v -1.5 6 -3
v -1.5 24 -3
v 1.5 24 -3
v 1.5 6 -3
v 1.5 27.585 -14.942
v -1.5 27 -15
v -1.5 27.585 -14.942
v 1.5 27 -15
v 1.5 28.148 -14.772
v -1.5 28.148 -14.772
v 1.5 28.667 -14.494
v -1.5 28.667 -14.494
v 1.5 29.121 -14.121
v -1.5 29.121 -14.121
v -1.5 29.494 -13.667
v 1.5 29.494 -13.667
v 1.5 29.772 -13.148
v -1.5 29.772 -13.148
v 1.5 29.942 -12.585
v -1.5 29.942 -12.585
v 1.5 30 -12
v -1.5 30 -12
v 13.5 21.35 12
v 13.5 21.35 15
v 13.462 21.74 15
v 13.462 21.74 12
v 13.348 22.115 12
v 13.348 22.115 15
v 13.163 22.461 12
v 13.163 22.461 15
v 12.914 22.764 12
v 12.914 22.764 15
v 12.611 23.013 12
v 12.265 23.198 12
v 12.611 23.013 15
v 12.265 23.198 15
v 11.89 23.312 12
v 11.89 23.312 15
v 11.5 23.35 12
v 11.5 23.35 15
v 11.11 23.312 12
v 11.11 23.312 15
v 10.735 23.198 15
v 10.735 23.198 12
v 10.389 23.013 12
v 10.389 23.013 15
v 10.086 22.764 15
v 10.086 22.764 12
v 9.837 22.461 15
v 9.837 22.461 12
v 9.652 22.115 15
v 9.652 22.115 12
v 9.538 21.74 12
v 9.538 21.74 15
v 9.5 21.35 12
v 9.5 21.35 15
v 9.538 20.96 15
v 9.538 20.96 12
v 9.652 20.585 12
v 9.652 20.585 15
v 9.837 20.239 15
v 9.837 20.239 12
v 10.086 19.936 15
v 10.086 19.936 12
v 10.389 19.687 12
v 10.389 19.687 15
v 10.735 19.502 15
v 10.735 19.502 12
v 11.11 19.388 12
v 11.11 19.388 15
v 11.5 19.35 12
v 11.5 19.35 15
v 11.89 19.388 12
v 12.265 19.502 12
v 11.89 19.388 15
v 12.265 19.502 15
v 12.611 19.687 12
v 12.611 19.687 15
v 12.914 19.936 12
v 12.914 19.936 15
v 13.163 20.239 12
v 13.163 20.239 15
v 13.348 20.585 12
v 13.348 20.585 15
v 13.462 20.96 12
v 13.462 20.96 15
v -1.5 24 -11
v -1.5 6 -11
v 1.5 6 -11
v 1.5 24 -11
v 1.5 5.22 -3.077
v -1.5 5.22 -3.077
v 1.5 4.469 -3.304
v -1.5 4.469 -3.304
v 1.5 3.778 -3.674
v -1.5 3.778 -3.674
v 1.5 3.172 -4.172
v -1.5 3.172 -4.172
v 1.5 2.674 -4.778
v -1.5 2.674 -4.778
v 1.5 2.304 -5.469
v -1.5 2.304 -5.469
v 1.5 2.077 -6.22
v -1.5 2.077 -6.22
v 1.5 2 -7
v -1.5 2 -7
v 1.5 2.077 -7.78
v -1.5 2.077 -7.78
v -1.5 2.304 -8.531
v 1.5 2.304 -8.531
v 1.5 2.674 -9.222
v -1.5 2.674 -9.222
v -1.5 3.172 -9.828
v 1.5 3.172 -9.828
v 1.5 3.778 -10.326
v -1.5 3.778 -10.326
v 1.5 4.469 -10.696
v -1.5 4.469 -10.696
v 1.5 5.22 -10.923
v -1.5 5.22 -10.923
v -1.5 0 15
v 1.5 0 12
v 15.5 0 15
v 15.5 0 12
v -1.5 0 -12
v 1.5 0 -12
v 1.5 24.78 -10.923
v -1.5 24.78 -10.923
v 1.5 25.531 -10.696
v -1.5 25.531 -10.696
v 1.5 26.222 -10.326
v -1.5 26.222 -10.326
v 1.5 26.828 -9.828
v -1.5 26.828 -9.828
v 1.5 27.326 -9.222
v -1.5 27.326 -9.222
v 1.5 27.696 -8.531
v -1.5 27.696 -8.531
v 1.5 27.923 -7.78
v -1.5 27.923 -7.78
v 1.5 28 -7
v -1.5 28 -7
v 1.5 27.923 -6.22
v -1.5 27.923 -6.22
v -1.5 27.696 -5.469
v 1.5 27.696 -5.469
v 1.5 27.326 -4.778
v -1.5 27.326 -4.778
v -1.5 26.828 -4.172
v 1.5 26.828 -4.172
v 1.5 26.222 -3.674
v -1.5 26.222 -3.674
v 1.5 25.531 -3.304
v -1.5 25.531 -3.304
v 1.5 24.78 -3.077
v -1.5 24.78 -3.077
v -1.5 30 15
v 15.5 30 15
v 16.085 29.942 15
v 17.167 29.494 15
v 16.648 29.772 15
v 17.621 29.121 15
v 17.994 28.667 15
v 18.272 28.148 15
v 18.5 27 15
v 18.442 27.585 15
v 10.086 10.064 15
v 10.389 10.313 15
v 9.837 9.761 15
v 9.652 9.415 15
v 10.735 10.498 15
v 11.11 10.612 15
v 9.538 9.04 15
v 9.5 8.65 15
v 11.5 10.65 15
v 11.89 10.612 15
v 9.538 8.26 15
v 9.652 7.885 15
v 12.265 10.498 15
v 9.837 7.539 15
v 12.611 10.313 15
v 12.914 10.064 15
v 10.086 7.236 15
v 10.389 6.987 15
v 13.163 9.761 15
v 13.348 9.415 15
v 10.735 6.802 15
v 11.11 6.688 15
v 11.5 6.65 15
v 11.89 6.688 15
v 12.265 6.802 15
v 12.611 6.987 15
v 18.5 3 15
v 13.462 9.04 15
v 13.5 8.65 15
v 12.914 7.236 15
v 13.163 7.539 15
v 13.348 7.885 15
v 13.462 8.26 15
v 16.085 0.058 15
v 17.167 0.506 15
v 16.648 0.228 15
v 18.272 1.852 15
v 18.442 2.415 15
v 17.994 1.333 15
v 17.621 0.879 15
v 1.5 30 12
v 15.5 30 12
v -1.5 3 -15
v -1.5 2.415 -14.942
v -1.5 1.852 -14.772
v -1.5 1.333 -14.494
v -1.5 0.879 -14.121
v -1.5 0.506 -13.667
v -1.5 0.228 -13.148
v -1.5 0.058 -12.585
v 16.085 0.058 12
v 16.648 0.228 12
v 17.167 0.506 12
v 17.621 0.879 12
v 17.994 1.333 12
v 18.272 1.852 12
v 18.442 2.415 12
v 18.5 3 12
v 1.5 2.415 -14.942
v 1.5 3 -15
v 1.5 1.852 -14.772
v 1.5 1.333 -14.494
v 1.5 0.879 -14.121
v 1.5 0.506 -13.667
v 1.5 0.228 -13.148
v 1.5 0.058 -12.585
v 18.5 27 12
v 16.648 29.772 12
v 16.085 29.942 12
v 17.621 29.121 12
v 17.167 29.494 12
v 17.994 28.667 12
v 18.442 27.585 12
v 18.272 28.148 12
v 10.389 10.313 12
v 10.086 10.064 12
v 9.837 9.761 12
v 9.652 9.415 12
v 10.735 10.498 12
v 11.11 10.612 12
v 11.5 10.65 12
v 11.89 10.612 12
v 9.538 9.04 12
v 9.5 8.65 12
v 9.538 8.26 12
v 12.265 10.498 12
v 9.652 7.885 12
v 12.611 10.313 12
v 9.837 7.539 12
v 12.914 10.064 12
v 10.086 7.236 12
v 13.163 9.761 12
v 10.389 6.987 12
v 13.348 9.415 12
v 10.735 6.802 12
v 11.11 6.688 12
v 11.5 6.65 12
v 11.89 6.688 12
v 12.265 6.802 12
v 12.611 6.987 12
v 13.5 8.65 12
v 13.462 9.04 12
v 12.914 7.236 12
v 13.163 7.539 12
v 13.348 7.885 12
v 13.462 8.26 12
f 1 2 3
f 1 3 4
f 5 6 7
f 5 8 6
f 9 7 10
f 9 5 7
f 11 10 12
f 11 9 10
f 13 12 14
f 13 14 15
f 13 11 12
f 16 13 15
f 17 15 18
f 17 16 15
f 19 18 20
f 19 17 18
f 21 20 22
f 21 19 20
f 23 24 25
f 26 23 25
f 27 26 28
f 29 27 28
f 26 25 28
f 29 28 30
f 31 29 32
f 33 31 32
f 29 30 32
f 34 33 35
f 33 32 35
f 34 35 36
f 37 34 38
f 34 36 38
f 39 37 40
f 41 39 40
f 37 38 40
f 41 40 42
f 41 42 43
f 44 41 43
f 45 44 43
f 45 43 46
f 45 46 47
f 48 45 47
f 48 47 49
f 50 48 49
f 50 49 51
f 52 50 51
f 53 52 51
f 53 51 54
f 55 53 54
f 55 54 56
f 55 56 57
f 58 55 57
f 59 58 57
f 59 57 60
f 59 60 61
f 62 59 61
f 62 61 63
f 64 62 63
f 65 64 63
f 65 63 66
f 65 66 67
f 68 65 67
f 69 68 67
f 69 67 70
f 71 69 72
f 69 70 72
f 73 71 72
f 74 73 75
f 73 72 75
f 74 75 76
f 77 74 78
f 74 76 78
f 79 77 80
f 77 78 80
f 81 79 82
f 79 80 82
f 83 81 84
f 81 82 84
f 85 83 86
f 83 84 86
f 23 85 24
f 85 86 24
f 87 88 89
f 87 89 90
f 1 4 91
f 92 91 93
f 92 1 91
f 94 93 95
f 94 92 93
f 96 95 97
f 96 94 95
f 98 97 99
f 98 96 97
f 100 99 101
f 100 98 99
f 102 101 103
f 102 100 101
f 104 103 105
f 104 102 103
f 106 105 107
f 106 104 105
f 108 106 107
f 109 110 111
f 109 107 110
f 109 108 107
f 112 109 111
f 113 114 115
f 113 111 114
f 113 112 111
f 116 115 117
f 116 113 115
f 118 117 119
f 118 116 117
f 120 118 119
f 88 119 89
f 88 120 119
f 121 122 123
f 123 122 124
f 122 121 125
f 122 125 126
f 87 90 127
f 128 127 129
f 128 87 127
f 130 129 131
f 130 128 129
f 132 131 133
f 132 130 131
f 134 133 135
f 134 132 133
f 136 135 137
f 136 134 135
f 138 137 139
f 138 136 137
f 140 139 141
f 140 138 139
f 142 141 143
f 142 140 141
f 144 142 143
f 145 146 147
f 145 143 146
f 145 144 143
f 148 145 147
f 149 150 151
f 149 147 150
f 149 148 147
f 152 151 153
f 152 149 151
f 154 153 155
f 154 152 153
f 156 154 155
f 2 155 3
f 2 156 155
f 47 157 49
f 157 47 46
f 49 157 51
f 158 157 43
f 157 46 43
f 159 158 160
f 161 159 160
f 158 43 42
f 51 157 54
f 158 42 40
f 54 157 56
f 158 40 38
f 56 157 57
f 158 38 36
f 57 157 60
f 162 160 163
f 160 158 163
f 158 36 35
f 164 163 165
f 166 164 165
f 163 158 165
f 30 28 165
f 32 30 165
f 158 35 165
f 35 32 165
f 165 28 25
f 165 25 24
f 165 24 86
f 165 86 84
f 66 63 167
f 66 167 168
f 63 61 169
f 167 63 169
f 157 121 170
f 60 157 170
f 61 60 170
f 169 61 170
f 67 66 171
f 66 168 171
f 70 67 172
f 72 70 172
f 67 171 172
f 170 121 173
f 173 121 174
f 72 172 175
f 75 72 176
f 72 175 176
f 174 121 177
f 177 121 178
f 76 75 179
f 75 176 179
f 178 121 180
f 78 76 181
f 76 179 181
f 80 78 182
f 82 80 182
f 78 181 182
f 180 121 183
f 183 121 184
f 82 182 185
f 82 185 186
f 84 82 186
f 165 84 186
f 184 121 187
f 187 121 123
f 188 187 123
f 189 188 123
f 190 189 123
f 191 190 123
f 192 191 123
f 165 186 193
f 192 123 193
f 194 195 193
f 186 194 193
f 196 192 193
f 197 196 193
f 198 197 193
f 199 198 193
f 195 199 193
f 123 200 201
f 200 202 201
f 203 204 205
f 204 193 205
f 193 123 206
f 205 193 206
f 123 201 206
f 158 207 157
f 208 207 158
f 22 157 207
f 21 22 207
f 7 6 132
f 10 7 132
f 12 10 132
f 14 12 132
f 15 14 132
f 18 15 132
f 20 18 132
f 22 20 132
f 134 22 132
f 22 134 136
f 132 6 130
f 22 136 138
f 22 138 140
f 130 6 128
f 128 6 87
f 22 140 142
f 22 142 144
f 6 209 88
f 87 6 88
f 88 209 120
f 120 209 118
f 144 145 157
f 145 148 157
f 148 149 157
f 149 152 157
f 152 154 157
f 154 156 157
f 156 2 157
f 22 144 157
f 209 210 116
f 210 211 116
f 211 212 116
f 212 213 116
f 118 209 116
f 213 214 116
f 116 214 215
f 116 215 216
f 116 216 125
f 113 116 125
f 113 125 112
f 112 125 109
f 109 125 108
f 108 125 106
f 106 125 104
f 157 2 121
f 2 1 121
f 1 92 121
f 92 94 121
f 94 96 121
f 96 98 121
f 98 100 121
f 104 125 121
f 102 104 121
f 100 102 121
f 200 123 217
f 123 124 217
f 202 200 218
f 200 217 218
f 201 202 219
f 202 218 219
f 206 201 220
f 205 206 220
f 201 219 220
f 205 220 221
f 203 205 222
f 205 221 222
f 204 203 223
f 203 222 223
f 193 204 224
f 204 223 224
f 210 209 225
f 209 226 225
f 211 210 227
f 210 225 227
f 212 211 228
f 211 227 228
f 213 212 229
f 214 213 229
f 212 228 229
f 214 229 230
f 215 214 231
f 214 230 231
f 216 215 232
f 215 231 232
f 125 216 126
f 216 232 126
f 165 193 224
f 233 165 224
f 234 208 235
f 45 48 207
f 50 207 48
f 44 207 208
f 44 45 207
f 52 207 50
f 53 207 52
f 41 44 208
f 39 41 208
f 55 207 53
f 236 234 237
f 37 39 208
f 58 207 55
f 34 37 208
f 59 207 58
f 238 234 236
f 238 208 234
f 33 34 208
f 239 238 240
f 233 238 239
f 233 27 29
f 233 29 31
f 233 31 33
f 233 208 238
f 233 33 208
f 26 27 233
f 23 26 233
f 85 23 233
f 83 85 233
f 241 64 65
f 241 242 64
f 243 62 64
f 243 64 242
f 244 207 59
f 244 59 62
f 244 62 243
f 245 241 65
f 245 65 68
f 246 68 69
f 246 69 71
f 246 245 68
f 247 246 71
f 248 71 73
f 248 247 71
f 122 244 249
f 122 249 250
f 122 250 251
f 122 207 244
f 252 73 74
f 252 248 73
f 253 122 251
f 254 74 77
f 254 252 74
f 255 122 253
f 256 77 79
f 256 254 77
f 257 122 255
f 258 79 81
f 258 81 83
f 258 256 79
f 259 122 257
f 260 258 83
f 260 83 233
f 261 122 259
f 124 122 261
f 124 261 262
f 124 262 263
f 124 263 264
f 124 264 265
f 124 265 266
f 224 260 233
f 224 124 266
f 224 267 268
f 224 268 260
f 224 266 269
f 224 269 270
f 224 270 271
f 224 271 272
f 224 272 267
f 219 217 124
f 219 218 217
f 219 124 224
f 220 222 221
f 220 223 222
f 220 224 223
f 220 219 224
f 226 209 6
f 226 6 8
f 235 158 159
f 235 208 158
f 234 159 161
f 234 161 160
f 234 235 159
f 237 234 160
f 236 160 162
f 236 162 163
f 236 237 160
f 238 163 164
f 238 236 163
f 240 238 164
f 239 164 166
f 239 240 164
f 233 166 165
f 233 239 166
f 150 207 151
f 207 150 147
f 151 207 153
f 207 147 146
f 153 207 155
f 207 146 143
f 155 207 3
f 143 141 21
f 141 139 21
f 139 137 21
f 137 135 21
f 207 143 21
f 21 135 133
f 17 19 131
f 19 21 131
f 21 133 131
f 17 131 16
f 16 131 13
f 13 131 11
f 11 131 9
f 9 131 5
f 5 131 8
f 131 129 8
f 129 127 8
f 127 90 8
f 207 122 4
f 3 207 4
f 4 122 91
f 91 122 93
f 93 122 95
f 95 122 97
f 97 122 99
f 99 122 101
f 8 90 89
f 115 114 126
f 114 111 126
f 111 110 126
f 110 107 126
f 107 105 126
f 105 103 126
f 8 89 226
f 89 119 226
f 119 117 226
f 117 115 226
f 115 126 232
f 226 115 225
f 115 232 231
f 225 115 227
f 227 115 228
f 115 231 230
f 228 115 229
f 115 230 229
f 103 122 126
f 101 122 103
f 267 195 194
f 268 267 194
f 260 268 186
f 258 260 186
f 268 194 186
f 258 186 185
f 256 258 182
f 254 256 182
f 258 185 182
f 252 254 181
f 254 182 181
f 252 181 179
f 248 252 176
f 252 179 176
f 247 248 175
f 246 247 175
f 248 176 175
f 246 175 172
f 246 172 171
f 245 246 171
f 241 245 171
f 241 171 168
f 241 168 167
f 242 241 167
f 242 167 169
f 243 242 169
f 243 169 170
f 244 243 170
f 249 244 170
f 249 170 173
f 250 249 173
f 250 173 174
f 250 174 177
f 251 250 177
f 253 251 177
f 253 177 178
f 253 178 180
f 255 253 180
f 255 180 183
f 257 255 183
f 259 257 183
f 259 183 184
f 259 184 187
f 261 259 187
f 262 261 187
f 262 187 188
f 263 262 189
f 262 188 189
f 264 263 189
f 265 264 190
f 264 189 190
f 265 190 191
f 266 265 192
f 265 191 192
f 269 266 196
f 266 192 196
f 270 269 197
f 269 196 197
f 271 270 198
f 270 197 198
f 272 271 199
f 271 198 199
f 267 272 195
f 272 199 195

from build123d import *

# Parameters (mm, degrees)
SKETCH_1_W          = 3
SKETCH_1_H          = 27
SKETCH_1_H_2        = 3
SKETCH_1_W_2        = 17
EXTRUDE_1_DEPTH     = 30
SKETCH_2_R          = 2
CUT_EXTRUDE_1_DEPTH = 10
CUT_EXTRUDE_2_DEPTH = 10
FILLET_1_R          = 3


with BuildPart() as part:
    # 草图1 → 凸台-拉伸1 (new body)
    with BuildSketch(Plane(origin=(0, 0, 0), x_dir=(1, 0, 0), z_dir=(0, 1, 0))):
        with Locations((0, 1.5)):
            Rectangle(SKETCH_1_W, SKETCH_1_H)
        with Locations((0, -13.5)):
            Rectangle(SKETCH_1_W, SKETCH_1_H_2)
        with Locations((10, -13.5)):
            Rectangle(SKETCH_1_W_2, SKETCH_1_H_2)
    extrude(amount=EXTRUDE_1_DEPTH)

    # 草图2 → 切除-拉伸1 (cut)
    with BuildSketch(Plane.XY.offset(15)):
        with Locations((11.5, 21.35)):
            Circle(SKETCH_2_R)
        with Locations((11.5, 8.65)):
            Circle(SKETCH_2_R)
        with Locations((11.5, -4.05)):
            Circle(SKETCH_2_R)
    extrude(amount=-CUT_EXTRUDE_1_DEPTH, mode=Mode.SUBTRACT)

    # 草图3 → 切除-拉伸2 (cut)
    with BuildSketch(Plane.ZY.offset(1.5)):
        with BuildLine():
            Line((-3, 24), (-3, 6))
            ThreePointArc((-3, 6), (-7, 2), (-11, 6))
            Line((-11, 6), (-11, 24))
            ThreePointArc((-11, 24), (-7, 28), (-3, 24))
        make_face()
    extrude(amount=-CUT_EXTRUDE_2_DEPTH, mode=Mode.SUBTRACT)

    # 圆角1
    fillet_1_edges = [part.edges().sort_by_distance(p)[0] for p in [
        (18.5, 0, 13.5),
        (18.5, 30, 13.5),
        (0, 30, -15),
        (0, 0, -15),
    ]]
    fillet(fillet_1_edges, radius=FILLET_1_R)


solid = part.part
